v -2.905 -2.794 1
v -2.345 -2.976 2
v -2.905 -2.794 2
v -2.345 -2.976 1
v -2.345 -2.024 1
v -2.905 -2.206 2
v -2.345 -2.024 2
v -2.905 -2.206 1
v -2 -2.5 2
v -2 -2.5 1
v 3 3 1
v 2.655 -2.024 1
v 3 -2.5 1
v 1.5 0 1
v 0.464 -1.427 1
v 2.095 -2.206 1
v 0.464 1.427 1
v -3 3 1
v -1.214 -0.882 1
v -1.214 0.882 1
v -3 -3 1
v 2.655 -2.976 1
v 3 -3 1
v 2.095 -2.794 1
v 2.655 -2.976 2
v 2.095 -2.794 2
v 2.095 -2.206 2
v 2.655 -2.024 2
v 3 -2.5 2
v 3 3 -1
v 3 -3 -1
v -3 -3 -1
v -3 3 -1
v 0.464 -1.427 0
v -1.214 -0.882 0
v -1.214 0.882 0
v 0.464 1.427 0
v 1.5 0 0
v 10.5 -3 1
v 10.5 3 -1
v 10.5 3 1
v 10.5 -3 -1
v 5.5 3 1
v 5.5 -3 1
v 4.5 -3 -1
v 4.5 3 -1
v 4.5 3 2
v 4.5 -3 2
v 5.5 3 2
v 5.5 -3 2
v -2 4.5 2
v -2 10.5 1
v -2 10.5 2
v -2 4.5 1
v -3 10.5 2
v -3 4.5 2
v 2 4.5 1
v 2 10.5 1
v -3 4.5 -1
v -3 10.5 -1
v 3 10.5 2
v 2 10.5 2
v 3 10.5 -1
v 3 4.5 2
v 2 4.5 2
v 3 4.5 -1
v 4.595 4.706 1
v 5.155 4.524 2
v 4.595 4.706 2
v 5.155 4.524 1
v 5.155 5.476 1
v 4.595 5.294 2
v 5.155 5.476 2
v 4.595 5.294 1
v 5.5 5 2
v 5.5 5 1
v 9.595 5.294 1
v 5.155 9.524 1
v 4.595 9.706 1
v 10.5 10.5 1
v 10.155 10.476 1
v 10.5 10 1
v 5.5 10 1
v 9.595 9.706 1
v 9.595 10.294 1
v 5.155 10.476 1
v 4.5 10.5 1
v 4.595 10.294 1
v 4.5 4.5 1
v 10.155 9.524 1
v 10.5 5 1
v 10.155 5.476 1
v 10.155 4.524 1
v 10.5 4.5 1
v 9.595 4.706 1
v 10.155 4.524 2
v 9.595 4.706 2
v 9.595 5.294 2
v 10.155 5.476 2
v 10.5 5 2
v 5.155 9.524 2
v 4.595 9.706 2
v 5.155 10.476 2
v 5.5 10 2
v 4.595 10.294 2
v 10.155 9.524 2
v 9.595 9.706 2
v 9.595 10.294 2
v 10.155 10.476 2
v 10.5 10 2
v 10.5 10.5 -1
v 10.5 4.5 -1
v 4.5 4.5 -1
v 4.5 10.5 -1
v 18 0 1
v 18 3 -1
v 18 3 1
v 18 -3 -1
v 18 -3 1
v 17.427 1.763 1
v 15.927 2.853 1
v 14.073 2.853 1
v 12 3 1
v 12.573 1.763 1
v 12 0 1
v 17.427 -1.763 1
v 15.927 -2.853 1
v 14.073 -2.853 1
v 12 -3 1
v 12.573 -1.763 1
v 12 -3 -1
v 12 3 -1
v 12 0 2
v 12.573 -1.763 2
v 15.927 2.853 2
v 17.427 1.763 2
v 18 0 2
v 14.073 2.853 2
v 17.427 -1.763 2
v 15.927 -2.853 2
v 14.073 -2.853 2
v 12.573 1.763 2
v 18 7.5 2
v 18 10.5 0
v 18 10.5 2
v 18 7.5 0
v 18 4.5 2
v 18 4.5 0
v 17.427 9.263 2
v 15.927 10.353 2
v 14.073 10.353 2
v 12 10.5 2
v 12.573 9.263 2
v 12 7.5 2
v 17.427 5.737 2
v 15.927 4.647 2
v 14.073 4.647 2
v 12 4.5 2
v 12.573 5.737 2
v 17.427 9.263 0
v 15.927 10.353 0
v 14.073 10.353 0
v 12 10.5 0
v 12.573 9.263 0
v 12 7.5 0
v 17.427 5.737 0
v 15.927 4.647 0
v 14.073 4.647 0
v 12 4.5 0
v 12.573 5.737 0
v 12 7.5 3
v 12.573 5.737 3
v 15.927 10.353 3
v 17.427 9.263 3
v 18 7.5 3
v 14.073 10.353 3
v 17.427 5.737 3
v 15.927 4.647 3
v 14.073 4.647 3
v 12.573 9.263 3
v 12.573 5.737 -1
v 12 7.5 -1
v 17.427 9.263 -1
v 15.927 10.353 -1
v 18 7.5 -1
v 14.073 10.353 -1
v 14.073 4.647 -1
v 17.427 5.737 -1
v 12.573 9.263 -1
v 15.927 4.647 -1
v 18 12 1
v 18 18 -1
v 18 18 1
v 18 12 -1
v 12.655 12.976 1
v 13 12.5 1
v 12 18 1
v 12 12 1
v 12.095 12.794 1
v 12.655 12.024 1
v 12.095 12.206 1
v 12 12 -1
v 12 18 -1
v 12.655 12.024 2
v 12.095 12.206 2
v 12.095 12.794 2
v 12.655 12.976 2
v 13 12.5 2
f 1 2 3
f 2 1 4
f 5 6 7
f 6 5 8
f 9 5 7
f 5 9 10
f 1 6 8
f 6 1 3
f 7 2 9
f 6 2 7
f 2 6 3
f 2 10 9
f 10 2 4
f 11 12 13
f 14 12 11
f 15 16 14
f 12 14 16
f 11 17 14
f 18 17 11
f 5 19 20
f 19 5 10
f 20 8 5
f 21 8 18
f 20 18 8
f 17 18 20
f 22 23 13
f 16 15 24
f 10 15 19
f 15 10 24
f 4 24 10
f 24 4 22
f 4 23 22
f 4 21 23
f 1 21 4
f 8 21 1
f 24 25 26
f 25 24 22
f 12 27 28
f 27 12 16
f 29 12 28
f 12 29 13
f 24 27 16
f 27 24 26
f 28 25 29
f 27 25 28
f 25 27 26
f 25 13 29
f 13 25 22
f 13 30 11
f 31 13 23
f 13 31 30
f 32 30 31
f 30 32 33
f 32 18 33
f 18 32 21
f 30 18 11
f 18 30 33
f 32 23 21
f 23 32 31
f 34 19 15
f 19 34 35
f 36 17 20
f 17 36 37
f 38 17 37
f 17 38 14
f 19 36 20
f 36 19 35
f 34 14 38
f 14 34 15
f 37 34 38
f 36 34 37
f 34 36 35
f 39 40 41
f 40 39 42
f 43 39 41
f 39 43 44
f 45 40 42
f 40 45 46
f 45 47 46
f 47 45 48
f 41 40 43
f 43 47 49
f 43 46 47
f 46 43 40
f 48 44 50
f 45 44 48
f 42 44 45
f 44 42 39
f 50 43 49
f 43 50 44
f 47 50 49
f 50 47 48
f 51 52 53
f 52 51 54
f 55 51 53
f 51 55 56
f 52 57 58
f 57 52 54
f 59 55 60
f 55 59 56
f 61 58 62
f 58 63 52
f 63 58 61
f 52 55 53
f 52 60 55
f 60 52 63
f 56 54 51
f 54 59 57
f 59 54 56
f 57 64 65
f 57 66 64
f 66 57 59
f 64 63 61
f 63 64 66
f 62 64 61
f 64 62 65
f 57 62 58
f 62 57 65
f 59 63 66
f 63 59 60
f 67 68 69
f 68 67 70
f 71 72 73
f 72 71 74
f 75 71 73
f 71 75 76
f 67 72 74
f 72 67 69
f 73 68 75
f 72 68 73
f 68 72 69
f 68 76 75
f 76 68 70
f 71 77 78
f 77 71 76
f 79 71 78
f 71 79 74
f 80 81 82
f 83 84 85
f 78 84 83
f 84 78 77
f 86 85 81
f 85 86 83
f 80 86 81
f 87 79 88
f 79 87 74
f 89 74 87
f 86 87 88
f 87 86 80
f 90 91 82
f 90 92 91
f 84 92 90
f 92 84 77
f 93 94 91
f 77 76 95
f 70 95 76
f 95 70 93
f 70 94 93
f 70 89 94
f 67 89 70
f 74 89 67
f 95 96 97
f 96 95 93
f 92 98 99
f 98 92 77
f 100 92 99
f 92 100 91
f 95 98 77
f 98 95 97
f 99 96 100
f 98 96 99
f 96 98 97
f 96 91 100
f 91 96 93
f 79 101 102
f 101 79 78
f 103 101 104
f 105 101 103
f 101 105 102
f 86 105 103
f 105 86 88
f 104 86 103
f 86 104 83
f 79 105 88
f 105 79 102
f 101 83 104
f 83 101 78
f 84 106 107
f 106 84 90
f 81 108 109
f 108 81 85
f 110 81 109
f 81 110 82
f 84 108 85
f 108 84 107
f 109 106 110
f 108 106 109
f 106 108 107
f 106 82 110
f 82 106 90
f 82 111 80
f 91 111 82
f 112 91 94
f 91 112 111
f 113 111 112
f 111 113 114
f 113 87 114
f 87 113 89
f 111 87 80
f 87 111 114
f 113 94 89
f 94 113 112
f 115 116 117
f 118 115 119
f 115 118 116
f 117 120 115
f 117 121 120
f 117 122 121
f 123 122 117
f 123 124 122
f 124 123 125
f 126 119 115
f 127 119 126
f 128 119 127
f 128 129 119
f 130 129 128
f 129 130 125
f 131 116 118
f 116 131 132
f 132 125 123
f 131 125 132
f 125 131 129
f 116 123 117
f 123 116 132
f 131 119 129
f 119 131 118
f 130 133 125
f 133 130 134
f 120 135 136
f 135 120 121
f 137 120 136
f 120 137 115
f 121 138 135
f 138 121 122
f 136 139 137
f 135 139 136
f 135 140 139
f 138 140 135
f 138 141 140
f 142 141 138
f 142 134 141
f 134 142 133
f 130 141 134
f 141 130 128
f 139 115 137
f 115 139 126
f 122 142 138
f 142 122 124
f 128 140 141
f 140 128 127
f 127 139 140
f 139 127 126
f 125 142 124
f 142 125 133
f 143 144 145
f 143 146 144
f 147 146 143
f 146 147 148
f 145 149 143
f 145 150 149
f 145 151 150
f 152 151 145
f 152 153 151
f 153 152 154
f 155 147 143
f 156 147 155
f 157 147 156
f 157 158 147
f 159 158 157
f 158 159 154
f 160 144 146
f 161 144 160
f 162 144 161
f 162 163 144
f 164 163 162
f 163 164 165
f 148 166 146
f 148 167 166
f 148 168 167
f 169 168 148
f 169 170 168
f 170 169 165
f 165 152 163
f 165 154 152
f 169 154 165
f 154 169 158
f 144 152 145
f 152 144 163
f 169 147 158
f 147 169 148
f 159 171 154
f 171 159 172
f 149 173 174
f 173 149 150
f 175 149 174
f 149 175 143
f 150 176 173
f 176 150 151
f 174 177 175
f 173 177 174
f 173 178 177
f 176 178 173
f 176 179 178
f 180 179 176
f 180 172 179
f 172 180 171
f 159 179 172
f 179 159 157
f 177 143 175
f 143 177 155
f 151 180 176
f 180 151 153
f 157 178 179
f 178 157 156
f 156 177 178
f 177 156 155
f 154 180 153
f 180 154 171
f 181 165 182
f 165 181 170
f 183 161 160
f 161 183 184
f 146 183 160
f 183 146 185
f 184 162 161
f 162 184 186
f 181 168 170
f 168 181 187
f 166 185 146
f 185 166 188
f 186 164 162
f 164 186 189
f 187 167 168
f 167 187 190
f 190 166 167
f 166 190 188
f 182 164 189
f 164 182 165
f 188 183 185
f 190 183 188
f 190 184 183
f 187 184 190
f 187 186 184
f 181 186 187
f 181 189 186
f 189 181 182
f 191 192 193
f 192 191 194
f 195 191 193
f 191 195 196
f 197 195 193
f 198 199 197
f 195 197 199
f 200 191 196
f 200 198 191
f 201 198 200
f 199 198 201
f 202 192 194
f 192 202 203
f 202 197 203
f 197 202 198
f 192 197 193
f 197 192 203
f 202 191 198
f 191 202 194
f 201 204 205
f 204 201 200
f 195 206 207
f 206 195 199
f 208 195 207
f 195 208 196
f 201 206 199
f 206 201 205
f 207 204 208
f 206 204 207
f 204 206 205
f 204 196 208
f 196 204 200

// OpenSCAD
// Squares!

//-- Globally used sizes --\\

// all units are mm
s = 6.0;   // square s length
t = 2.0;   // square thickness
h = 1.0;   // generic protrusion height
w = 1.0;   // generic protrusion width

//-- Some parts --\\

module base(){
    // The main square base
    cube([s, s, t], center=true);
    }

module rail(side, alt=1){
    // one long rail along one s on the top or bottom of the square
    //
    // side: right (1) or left (-1) s
    // alt (altitude): top (1) or bottom (-1)
    translate([side*(s - w)/2, 0, alt*(t + h)/2])
    cube([w, s, h], center=true);
    }

module post(corner, alt=1){
    // a post sticking up out of a corner
    // corner: gives the quadrant as list of two numbers: [+/-1, +/-1]
    //         e.g., [-1, 1] is the 2nd quadrant.
    translate([corner[0]*(s - w)/2, corner[1]*(s - w)/2, alt*(t+h)/2])
    cylinder(h=h, r=w/2, center=true);
    }

module disc(alt=1, size=1){
    // round disc with full rotational symmetry
    // size: diameter relative to the square
    // alt (altitude): top (1) or bottom (-1)
    translate([0, 0, alt*(t+h)/2])
    cylinder(h=h, r=size*s/2, center=true);
    }

//-- Some sub-assemblies for convenience --//

module two_rails(alt=1){
    // two parallel rails across from each other at given altitude
    union(){
    rail(-1, alt);
    rail(1, alt);
    }}

module one_rail(alt=1){
    union(){
    rail(-1, alt);
    }}

module postpair(alt=1){
    // two posts on one side
    union(){
    post([-1, -1], alt);
    post([1, -1], alt);
    }}

module four_posts(alt=1){
    union(){
    post([-1, -1], alt);
    post([1, -1], alt);
    post([-1, 1], alt);
    post([1, 1], alt);
    }
}

//-- Complete Particles --\\

spacing = 1.25*s; // the spacing between particles

difference(){
union(){ base(); postpair();}
translate([0,0,0])
cylinder(h=t, d=s/2);
}

translate([spacing, 0, 0])
union(){ base(); one_rail();}

translate([0, spacing, 0])
union(){ base(); two_rails();}

translate([spacing, spacing, 0])
union(){ base(); four_posts();}

translate([2*spacing, 0, 0])
union(){ base(); disc();}

translate([2*spacing, spacing, h])
union(){ base(); disc(); disc(-1);}

translate([2*spacing, 2*spacing, 0])
union(){ base(); post([-1, -1]);}
